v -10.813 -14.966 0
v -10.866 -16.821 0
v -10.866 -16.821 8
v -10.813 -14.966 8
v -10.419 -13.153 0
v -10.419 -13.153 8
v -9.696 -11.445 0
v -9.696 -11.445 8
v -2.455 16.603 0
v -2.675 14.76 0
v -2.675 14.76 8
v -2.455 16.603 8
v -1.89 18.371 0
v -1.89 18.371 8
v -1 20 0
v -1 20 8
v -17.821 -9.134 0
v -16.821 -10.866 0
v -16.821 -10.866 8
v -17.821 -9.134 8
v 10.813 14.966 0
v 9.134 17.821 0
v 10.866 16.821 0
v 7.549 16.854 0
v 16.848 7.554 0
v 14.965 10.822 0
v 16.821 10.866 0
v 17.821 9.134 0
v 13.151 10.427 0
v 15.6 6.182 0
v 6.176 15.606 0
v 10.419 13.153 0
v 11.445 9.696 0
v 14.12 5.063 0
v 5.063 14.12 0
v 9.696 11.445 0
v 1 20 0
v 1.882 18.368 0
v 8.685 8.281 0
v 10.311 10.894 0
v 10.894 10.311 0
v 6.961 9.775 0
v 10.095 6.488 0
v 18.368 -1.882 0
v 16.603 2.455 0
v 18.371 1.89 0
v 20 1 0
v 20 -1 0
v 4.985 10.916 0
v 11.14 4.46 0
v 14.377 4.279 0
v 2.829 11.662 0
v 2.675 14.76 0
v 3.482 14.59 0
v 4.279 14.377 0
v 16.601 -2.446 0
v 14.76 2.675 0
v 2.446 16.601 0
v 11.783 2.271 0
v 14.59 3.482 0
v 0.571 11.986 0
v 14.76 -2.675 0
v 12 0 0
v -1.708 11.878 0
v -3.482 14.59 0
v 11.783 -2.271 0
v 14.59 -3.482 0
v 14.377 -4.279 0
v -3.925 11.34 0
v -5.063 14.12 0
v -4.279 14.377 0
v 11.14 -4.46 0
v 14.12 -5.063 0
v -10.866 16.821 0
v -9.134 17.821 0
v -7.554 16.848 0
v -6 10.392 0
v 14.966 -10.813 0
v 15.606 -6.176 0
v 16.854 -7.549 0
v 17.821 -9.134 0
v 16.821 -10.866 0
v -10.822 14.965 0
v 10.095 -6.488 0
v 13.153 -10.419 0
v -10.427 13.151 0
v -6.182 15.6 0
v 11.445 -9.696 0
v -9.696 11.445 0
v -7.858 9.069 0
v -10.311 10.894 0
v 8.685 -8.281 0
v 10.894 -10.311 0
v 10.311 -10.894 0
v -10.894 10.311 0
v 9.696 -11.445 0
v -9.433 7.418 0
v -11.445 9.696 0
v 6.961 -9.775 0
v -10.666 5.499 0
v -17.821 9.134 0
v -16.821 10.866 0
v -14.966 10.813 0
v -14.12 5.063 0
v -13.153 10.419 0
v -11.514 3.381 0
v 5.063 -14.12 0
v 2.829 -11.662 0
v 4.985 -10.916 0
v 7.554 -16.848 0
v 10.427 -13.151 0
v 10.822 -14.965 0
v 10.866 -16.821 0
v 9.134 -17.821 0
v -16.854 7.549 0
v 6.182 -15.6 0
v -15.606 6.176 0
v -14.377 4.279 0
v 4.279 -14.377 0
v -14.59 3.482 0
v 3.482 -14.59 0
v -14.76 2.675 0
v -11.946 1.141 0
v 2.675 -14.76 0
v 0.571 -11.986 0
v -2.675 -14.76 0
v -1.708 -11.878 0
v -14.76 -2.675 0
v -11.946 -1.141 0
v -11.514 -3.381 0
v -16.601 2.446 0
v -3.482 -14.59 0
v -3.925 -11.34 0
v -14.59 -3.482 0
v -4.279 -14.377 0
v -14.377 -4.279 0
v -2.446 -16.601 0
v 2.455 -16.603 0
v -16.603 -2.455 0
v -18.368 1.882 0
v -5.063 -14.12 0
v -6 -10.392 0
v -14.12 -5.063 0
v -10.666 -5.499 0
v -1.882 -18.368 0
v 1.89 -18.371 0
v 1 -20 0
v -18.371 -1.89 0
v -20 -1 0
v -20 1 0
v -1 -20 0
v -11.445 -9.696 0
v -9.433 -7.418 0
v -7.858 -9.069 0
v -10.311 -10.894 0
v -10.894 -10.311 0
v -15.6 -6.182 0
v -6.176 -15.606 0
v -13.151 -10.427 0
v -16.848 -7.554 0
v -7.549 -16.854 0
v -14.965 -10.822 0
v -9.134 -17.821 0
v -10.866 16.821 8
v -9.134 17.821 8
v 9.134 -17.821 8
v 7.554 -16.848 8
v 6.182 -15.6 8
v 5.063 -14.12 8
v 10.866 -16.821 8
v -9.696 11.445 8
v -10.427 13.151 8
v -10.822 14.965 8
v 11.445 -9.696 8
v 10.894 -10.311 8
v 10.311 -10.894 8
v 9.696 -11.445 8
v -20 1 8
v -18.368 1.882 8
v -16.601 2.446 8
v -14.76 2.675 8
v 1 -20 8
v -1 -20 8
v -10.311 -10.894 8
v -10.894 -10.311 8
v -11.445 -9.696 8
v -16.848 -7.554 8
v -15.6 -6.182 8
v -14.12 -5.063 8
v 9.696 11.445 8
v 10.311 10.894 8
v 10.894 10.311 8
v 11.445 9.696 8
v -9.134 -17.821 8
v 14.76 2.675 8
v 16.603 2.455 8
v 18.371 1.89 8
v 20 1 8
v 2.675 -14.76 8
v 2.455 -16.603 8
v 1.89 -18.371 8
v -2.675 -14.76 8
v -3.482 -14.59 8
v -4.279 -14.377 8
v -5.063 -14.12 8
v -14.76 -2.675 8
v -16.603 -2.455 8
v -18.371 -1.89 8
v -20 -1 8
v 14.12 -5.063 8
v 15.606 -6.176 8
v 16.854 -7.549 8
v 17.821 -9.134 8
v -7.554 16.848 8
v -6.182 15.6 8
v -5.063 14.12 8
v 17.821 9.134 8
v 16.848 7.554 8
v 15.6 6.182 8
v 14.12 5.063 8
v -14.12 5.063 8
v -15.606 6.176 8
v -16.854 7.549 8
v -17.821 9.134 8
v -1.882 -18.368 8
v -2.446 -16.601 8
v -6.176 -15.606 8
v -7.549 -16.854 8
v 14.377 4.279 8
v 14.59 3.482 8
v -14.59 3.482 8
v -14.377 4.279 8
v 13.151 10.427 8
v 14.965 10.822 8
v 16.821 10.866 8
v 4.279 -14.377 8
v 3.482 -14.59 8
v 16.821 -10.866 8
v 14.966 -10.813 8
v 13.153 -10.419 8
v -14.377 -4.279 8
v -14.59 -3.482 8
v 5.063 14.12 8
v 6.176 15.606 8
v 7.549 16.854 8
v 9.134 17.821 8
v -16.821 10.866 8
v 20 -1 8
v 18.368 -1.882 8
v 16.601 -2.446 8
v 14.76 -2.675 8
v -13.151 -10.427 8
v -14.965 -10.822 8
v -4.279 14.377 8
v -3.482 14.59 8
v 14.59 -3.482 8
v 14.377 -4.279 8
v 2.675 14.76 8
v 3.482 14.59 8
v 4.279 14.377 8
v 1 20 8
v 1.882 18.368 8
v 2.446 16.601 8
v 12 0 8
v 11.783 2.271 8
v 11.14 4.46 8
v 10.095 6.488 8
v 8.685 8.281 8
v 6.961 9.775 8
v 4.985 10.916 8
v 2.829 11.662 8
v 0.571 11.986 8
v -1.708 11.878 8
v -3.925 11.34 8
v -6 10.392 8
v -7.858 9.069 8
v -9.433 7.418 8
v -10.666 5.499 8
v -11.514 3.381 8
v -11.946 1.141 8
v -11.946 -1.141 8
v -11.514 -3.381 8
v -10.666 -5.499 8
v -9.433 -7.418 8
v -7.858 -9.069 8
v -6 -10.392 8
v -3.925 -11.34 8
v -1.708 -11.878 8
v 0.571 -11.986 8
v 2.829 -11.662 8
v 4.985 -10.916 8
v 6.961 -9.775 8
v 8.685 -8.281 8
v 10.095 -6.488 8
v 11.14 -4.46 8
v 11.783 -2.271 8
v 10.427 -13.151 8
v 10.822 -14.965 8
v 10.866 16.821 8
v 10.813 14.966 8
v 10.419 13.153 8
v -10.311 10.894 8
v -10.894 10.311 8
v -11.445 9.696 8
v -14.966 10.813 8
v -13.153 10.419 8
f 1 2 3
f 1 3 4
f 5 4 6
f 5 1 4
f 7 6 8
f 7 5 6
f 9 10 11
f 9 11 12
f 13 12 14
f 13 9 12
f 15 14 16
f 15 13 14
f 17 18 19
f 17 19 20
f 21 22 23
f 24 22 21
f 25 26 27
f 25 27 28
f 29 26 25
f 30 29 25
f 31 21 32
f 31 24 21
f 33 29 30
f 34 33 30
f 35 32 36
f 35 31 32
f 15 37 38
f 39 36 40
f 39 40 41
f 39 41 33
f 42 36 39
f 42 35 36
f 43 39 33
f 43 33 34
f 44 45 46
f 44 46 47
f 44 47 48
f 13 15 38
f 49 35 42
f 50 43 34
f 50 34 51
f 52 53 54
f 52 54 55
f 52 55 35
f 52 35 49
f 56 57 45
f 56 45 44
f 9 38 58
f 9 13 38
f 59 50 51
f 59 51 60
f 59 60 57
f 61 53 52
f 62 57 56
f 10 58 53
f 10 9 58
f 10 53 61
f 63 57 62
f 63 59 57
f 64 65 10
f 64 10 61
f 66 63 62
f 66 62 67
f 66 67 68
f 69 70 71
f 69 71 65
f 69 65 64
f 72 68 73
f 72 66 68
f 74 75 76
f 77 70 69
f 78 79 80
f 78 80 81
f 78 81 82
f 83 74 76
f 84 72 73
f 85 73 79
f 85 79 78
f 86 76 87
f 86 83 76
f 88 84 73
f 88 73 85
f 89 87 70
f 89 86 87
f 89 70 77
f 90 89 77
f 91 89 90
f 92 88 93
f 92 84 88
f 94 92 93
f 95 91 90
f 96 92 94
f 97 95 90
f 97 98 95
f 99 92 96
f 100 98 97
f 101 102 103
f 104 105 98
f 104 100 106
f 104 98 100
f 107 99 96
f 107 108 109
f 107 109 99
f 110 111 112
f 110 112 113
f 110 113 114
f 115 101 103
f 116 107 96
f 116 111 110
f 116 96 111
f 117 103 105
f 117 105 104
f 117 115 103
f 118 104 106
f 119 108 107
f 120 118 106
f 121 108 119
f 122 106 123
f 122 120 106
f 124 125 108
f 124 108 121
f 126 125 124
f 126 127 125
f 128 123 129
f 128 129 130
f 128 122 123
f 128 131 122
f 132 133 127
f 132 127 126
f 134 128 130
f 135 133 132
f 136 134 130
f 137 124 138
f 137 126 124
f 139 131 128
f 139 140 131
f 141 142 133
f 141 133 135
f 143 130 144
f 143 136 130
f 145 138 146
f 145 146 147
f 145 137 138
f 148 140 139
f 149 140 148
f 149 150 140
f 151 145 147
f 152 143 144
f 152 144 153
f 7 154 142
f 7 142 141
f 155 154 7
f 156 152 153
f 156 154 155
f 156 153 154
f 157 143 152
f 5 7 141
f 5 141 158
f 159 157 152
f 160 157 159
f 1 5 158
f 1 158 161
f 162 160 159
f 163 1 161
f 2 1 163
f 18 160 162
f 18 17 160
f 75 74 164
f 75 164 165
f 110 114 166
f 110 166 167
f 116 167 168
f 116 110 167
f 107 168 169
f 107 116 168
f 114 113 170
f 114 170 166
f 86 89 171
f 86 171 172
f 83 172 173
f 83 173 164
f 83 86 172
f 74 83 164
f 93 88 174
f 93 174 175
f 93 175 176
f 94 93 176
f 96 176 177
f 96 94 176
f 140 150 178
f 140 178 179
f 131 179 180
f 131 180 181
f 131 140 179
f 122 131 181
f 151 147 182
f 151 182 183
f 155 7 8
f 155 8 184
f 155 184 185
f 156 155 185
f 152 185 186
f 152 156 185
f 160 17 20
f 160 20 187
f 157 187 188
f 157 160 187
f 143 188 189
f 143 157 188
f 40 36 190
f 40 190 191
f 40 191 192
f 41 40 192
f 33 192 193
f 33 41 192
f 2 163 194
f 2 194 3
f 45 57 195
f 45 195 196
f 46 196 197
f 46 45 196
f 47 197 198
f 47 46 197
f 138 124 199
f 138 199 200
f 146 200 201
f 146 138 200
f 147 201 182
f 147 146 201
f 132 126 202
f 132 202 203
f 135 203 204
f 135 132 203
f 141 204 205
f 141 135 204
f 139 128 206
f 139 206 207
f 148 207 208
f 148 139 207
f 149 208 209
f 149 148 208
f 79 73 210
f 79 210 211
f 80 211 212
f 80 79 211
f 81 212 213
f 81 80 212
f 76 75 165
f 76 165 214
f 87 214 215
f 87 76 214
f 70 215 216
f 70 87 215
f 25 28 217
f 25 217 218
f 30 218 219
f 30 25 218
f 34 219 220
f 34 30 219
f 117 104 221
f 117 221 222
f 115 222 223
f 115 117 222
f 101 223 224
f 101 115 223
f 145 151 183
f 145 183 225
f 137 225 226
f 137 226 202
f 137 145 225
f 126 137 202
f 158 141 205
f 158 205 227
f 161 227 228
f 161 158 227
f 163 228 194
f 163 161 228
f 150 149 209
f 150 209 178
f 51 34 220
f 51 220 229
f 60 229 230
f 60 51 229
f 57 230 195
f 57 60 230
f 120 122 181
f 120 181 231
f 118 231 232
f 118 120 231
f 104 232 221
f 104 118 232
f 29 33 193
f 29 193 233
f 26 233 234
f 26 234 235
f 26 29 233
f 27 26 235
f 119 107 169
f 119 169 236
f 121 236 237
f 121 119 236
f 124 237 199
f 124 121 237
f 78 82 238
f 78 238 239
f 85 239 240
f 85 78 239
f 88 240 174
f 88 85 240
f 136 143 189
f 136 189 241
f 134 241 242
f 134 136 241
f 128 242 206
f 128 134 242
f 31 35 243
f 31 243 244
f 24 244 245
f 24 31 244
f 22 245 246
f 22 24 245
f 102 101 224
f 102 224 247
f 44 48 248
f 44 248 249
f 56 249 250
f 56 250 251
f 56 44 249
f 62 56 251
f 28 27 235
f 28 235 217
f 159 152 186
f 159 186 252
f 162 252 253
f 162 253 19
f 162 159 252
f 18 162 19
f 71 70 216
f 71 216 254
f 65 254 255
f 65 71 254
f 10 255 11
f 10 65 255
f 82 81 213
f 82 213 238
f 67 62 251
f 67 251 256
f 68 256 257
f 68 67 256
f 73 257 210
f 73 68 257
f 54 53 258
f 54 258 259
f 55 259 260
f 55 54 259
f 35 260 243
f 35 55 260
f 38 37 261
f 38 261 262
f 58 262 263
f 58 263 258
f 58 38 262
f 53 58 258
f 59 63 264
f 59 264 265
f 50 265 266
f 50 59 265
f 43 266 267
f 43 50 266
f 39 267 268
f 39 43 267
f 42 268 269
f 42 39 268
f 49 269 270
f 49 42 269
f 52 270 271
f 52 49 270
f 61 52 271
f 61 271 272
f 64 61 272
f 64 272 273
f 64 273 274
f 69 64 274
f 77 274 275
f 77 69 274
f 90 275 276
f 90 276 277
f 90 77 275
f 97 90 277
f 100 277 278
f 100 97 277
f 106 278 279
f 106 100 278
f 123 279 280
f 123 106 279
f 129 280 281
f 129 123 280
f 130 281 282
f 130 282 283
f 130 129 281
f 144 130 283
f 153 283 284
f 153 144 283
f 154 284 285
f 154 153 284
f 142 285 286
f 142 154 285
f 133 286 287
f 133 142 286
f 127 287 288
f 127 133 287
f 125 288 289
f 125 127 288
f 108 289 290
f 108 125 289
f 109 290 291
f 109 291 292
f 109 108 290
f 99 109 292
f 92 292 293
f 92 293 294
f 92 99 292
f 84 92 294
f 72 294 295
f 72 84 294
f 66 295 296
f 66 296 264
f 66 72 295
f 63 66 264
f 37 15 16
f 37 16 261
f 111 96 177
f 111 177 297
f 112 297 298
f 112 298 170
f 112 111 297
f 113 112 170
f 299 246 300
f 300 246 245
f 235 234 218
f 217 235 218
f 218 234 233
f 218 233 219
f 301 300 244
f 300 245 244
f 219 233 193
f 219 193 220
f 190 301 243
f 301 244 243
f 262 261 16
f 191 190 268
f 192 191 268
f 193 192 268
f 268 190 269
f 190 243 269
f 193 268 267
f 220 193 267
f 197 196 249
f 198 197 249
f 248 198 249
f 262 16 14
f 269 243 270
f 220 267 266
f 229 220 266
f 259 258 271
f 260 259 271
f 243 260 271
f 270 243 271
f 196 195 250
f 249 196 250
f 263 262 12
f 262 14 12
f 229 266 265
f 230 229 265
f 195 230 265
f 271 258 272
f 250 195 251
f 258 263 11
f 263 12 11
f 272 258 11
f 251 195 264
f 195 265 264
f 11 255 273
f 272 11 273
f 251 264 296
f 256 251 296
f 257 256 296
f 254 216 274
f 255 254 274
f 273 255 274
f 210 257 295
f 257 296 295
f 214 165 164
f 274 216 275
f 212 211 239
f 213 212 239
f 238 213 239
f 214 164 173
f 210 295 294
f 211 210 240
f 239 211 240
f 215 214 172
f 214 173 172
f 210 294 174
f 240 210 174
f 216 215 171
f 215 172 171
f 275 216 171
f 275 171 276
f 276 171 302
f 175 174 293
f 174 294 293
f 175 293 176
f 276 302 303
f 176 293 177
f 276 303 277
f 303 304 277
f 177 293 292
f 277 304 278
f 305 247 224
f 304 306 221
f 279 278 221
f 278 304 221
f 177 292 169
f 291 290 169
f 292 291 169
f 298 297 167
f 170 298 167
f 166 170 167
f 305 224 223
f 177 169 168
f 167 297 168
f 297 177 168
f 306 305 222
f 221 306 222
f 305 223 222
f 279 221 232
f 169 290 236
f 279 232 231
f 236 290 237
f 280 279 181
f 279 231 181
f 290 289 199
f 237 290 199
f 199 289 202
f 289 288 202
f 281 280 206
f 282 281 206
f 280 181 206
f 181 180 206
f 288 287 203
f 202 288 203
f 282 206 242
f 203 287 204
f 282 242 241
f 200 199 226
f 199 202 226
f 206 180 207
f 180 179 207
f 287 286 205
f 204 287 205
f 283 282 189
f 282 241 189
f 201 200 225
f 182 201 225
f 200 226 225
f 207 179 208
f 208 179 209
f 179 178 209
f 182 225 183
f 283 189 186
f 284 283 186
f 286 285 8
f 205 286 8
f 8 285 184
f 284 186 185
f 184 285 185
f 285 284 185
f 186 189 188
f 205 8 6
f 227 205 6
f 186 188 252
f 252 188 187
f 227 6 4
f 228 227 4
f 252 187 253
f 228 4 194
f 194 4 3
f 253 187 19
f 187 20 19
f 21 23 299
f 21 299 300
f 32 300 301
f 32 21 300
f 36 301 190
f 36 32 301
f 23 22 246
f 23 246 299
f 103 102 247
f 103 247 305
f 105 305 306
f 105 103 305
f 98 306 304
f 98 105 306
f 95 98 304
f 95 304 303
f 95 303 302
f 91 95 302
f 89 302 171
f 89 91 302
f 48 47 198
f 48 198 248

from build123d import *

# Parameters (mm, degrees)
SKETCH1_R           = 12
BOSS_EXTRUDE1_DEPTH = 8


with BuildPart() as part:
    # Sketch1 → Boss-Extrude1 (new body)
    with BuildSketch(Plane(origin=(0, 0, 0), x_dir=(0, 1, 0), z_dir=(0, 0, 1))):
        with BuildLine():
            Line((20, 1), (20, -1))
            ThreePointArc((20, -1), (17.497232023, -2.204975942), (14.759551992, -2.675))
            ThreePointArc((14.759551992, -2.675), (14.488887394, -3.882285677), (14.119646973, -5.063158041))
            ThreePointArc((14.119646973, -5.063158041), (16.262701001, -6.832536438), (17.820508076, -9.133974596))
            Line((17.820508076, -9.133974596), (16.820508076, -10.866025404))
            ThreePointArc((16.820508076, -10.866025404), (14.050559457, -10.658181192), (11.444646973, -9.696393951))
            ThreePointArc((11.444646973, -9.696393951), (10.606601718, -10.606601718), (9.696393951, -11.444646973))
            ThreePointArc((9.696393951, -11.444646973), (10.667643983, -14.048500628), (10.866025404, -16.820508076))
            Line((10.866025404, -16.820508076), (9.133974596, -17.820508076))
            ThreePointArc((9.133974596, -17.820508076), (6.839050831, -16.255535399), (5.063158041, -14.119646973))
            ThreePointArc((5.063158041, -14.119646973), (3.882285677, -14.488887394), (2.675, -14.759551992))
            ThreePointArc((2.675, -14.759551992), (2.214200373, -17.50018042), (1, -20))
            Line((1, -20), (-1, -20))
            ThreePointArc((-1, -20), (-2.204975942, -17.497232023), (-2.675, -14.759551992))
            ThreePointArc((-2.675, -14.759551992), (-3.882285677, -14.488887394), (-5.063158041, -14.119646973))
            ThreePointArc((-5.063158041, -14.119646973), (-6.832536438, -16.262701001), (-9.133974596, -17.820508076))
            Line((-9.133974596, -17.820508076), (-10.866025404, -16.820508076))
            ThreePointArc((-10.866025404, -16.820508076), (-10.658181192, -14.050559457), (-9.696393951, -11.444646973))
            ThreePointArc((-9.696393951, -11.444646973), (-10.606601718, -10.606601718), (-11.444646973, -9.696393951))
            ThreePointArc((-11.444646973, -9.696393951), (-14.048500628, -10.667643983), (-16.820508076, -10.866025404))
            Line((-16.820508076, -10.866025404), (-17.820508076, -9.133974596))
            ThreePointArc((-17.820508076, -9.133974596), (-16.255535399, -6.839050831), (-14.119646973, -5.063158041))
            ThreePointArc((-14.119646973, -5.063158041), (-14.488887394, -3.882285677), (-14.759551992, -2.675))
            ThreePointArc((-14.759551992, -2.675), (-17.50018042, -2.214200373), (-20, -1))
            Line((-20, -1), (-20, 1))
            ThreePointArc((-20, 1), (-17.497232023, 2.204975942), (-14.759551992, 2.675))
            ThreePointArc((-14.759551992, 2.675), (-14.488887394, 3.882285677), (-14.119646973, 5.063158041))
            ThreePointArc((-14.119646973, 5.063158041), (-16.262701001, 6.832536438), (-17.820508076, 9.133974596))
            Line((-17.820508076, 9.133974596), (-16.820508076, 10.866025404))
            ThreePointArc((-16.820508076, 10.866025404), (-14.050559457, 10.658181192), (-11.444646973, 9.696393951))
            ThreePointArc((-11.444646973, 9.696393951), (-10.606601718, 10.606601718), (-9.696393951, 11.444646973))
            ThreePointArc((-9.696393951, 11.444646973), (-10.667643983, 14.048500628), (-10.866025404, 16.820508076))
            Line((-10.866025404, 16.820508076), (-9.133974596, 17.820508076))
            ThreePointArc((-9.133974596, 17.820508076), (-6.839050831, 16.255535399), (-5.063158041, 14.119646973))
            ThreePointArc((-5.063158041, 14.119646973), (-3.882285677, 14.488887394), (-2.675, 14.759551992))
            ThreePointArc((-2.675, 14.759551992), (-2.214200373, 17.50018042), (-1, 20))
            Line((-1, 20), (1, 20))
            ThreePointArc((1, 20), (2.204975942, 17.497232023), (2.675, 14.759551992))
            ThreePointArc((2.675, 14.759551992), (3.882285677, 14.488887394), (5.063158041, 14.119646973))
            ThreePointArc((5.063158041, 14.119646973), (6.832536438, 16.262701001), (9.133974596, 17.820508076))
            Line((9.133974596, 17.820508076), (10.866025404, 16.820508076))
            ThreePointArc((10.866025404, 16.820508076), (10.658181192, 14.050559457), (9.696393951, 11.444646973))
            ThreePointArc((9.696393951, 11.444646973), (10.606601718, 10.606601718), (11.444646973, 9.696393951))
            ThreePointArc((11.444646973, 9.696393951), (14.048500628, 10.667643983), (16.820508076, 10.866025404))
            Line((16.820508076, 10.866025404), (17.820508076, 9.133974596))
            ThreePointArc((17.820508076, 9.133974596), (16.255535399, 6.839050831), (14.119646973, 5.063158041))
            ThreePointArc((14.119646973, 5.063158041), (14.488887394, 3.882285677), (14.759551992, 2.675))
            ThreePointArc((14.759551992, 2.675), (17.50018042, 2.214200373), (20, 1))
        make_face()
        with Locations(Location((0, 0, 0), (0, 0, 270))):
            Circle(SKETCH1_R, mode=Mode.SUBTRACT)
    extrude(amount=BOSS_EXTRUDE1_DEPTH)


solid = part.part
